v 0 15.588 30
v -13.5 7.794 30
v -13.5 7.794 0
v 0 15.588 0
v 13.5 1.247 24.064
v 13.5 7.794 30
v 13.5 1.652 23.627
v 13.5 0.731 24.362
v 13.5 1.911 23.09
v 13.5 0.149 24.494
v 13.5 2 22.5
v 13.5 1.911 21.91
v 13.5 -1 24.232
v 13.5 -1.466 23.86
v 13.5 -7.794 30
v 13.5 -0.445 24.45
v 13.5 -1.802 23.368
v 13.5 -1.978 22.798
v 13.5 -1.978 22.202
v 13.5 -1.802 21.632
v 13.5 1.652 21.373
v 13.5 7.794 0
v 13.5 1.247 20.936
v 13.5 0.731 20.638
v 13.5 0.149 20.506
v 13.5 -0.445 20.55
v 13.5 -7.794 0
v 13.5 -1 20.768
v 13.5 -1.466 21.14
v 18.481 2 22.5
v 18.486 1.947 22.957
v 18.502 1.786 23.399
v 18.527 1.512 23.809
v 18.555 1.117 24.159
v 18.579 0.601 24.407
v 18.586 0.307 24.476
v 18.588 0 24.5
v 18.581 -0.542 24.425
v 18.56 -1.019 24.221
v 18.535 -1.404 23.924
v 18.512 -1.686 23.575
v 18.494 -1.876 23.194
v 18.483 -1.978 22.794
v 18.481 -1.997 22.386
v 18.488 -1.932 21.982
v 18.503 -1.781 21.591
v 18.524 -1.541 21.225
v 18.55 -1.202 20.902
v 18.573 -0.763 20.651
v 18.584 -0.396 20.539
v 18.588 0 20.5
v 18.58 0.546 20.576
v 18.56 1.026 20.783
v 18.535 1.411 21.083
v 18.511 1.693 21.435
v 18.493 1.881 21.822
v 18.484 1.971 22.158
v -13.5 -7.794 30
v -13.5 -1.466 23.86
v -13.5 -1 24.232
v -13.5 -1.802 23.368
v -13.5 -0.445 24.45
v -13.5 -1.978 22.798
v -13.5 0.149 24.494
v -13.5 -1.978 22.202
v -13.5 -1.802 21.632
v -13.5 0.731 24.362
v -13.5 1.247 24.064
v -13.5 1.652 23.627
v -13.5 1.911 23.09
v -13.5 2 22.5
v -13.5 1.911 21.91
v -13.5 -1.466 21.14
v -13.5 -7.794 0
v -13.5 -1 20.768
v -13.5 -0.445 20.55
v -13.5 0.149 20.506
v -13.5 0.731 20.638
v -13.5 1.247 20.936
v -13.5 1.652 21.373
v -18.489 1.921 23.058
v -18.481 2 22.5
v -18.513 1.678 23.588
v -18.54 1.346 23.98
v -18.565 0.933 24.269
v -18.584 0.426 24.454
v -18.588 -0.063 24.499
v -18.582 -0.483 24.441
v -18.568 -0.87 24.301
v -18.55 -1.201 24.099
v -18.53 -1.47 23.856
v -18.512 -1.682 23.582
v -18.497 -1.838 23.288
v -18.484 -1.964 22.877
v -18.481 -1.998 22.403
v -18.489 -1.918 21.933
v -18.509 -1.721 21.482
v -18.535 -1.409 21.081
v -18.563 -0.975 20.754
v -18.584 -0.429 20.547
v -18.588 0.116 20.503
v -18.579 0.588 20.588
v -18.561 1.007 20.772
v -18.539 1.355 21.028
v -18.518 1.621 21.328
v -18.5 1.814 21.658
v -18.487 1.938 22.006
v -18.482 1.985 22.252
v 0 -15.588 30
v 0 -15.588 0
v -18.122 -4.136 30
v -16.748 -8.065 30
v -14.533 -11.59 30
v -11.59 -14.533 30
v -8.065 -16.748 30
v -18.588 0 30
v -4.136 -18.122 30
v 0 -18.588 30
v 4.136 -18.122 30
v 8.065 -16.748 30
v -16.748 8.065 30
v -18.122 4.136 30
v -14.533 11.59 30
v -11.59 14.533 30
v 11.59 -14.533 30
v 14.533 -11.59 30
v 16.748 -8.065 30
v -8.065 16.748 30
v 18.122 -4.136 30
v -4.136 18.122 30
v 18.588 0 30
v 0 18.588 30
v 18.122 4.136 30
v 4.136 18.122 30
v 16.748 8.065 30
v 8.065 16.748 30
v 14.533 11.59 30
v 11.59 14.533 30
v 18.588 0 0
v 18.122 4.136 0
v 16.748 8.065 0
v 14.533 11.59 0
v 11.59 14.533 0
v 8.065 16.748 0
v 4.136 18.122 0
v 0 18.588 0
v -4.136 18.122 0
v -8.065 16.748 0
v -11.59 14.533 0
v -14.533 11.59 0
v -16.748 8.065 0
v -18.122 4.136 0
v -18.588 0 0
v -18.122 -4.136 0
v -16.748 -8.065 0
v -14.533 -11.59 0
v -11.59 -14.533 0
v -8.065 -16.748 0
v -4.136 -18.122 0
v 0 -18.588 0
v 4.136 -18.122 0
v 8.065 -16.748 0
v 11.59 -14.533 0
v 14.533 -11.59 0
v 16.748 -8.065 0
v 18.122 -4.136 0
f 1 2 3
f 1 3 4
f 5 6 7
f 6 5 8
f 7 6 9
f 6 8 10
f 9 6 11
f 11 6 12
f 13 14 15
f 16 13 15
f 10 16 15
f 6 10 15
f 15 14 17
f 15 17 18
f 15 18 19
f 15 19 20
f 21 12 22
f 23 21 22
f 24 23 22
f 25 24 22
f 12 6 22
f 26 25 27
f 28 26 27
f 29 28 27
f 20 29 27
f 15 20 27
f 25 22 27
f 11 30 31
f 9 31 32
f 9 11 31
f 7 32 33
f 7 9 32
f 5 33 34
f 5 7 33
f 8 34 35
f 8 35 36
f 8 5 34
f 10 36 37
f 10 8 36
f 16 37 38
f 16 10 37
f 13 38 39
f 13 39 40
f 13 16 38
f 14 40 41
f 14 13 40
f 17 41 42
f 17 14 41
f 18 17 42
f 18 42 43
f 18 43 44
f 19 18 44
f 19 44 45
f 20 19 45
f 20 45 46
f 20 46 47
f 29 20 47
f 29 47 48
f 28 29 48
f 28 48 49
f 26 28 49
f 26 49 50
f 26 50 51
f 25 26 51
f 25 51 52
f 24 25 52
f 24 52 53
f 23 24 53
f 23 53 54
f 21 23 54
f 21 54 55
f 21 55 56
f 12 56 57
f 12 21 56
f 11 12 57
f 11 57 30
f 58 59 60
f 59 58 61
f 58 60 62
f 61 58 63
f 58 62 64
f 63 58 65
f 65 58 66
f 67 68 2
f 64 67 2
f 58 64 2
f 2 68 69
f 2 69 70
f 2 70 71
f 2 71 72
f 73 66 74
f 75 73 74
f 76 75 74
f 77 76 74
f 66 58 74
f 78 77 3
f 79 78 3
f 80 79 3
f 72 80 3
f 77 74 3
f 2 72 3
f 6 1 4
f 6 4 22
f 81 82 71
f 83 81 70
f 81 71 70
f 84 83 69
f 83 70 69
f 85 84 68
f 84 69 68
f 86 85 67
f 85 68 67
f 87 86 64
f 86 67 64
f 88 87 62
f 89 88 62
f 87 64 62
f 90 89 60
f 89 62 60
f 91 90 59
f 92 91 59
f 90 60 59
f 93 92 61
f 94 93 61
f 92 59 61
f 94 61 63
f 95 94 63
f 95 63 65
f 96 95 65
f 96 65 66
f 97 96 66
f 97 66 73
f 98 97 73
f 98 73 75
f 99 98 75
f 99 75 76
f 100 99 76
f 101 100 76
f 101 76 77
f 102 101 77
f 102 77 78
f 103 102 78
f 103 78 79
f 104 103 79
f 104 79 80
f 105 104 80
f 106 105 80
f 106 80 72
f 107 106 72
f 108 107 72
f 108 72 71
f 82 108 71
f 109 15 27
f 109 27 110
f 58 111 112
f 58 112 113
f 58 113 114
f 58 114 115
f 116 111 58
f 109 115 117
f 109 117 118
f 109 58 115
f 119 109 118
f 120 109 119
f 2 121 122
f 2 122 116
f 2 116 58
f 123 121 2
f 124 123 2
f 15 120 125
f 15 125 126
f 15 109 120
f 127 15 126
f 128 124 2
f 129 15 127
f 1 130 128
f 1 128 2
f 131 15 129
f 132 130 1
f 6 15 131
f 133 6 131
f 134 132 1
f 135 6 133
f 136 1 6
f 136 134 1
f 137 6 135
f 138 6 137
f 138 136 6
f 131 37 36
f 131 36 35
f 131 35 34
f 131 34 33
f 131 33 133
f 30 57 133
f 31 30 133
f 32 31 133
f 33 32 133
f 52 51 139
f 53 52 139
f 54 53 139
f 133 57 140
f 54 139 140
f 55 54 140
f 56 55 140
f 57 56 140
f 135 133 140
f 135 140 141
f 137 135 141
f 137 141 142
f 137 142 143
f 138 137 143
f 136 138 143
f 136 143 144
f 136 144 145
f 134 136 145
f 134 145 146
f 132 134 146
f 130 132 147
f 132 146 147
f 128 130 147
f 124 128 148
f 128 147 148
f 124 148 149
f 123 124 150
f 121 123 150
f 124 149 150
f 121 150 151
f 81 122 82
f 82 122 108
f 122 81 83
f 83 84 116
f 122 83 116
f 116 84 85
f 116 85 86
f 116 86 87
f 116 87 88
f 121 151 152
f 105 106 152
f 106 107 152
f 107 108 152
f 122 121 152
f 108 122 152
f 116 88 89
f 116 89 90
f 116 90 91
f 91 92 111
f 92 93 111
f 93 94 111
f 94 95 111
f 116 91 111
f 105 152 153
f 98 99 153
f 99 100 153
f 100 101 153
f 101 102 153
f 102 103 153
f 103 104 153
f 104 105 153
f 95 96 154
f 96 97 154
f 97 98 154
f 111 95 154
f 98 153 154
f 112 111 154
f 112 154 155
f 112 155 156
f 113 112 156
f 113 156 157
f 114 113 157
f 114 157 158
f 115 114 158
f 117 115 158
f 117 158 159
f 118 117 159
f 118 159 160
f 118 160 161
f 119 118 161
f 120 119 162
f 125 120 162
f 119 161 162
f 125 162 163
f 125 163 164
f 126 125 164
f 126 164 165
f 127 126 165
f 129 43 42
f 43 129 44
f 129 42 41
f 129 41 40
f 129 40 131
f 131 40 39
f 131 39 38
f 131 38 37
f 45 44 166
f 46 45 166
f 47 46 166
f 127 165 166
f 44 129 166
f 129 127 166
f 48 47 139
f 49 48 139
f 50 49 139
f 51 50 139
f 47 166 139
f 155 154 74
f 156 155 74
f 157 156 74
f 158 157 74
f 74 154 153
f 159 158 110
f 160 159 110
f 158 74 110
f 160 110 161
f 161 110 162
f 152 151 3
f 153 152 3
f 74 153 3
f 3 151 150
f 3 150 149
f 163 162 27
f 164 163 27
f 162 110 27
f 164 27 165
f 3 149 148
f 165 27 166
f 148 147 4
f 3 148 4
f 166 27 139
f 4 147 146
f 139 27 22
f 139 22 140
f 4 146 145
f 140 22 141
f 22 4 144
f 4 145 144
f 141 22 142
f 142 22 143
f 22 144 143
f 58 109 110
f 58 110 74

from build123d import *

# Parameters (mm, degrees)
F0_R          = 18.5884572681
F1_DEPTH      = 30
F2_R          = 2
F3_DEPTH      = 5.0894572681
F3_DEPTH_BACK = 32.0894572681


# Not quite as in the source:
# - a feature names something its author has since deleted; it is built from what else it names


with BuildPart() as f1:
    # F0 (on Top) → F1 (new body)
    with BuildSketch(Plane.XY):
        Circle(F0_R)
        Polygon((0, 15.5884572681), (13.5, 7.7942286341), (13.5, -7.7942286341), (0, -15.5884572681), (-13.5, -7.7942286341), (-13.5, 7.7942286341), align=None, mode=Mode.SUBTRACT)
    extrude(amount=F1_DEPTH)

    # F2 (on face) → F3 (cut, two sides)
    with BuildSketch(Plane.YZ.offset(-13.5)) as f3_sk:
        with Locations((0, 22.5)):
            Circle(F2_R)
    extrude(amount=-F3_DEPTH, mode=Mode.SUBTRACT)
    extrude(f3_sk.sketch, amount=F3_DEPTH_BACK, mode=Mode.SUBTRACT)


solid = f1.part
